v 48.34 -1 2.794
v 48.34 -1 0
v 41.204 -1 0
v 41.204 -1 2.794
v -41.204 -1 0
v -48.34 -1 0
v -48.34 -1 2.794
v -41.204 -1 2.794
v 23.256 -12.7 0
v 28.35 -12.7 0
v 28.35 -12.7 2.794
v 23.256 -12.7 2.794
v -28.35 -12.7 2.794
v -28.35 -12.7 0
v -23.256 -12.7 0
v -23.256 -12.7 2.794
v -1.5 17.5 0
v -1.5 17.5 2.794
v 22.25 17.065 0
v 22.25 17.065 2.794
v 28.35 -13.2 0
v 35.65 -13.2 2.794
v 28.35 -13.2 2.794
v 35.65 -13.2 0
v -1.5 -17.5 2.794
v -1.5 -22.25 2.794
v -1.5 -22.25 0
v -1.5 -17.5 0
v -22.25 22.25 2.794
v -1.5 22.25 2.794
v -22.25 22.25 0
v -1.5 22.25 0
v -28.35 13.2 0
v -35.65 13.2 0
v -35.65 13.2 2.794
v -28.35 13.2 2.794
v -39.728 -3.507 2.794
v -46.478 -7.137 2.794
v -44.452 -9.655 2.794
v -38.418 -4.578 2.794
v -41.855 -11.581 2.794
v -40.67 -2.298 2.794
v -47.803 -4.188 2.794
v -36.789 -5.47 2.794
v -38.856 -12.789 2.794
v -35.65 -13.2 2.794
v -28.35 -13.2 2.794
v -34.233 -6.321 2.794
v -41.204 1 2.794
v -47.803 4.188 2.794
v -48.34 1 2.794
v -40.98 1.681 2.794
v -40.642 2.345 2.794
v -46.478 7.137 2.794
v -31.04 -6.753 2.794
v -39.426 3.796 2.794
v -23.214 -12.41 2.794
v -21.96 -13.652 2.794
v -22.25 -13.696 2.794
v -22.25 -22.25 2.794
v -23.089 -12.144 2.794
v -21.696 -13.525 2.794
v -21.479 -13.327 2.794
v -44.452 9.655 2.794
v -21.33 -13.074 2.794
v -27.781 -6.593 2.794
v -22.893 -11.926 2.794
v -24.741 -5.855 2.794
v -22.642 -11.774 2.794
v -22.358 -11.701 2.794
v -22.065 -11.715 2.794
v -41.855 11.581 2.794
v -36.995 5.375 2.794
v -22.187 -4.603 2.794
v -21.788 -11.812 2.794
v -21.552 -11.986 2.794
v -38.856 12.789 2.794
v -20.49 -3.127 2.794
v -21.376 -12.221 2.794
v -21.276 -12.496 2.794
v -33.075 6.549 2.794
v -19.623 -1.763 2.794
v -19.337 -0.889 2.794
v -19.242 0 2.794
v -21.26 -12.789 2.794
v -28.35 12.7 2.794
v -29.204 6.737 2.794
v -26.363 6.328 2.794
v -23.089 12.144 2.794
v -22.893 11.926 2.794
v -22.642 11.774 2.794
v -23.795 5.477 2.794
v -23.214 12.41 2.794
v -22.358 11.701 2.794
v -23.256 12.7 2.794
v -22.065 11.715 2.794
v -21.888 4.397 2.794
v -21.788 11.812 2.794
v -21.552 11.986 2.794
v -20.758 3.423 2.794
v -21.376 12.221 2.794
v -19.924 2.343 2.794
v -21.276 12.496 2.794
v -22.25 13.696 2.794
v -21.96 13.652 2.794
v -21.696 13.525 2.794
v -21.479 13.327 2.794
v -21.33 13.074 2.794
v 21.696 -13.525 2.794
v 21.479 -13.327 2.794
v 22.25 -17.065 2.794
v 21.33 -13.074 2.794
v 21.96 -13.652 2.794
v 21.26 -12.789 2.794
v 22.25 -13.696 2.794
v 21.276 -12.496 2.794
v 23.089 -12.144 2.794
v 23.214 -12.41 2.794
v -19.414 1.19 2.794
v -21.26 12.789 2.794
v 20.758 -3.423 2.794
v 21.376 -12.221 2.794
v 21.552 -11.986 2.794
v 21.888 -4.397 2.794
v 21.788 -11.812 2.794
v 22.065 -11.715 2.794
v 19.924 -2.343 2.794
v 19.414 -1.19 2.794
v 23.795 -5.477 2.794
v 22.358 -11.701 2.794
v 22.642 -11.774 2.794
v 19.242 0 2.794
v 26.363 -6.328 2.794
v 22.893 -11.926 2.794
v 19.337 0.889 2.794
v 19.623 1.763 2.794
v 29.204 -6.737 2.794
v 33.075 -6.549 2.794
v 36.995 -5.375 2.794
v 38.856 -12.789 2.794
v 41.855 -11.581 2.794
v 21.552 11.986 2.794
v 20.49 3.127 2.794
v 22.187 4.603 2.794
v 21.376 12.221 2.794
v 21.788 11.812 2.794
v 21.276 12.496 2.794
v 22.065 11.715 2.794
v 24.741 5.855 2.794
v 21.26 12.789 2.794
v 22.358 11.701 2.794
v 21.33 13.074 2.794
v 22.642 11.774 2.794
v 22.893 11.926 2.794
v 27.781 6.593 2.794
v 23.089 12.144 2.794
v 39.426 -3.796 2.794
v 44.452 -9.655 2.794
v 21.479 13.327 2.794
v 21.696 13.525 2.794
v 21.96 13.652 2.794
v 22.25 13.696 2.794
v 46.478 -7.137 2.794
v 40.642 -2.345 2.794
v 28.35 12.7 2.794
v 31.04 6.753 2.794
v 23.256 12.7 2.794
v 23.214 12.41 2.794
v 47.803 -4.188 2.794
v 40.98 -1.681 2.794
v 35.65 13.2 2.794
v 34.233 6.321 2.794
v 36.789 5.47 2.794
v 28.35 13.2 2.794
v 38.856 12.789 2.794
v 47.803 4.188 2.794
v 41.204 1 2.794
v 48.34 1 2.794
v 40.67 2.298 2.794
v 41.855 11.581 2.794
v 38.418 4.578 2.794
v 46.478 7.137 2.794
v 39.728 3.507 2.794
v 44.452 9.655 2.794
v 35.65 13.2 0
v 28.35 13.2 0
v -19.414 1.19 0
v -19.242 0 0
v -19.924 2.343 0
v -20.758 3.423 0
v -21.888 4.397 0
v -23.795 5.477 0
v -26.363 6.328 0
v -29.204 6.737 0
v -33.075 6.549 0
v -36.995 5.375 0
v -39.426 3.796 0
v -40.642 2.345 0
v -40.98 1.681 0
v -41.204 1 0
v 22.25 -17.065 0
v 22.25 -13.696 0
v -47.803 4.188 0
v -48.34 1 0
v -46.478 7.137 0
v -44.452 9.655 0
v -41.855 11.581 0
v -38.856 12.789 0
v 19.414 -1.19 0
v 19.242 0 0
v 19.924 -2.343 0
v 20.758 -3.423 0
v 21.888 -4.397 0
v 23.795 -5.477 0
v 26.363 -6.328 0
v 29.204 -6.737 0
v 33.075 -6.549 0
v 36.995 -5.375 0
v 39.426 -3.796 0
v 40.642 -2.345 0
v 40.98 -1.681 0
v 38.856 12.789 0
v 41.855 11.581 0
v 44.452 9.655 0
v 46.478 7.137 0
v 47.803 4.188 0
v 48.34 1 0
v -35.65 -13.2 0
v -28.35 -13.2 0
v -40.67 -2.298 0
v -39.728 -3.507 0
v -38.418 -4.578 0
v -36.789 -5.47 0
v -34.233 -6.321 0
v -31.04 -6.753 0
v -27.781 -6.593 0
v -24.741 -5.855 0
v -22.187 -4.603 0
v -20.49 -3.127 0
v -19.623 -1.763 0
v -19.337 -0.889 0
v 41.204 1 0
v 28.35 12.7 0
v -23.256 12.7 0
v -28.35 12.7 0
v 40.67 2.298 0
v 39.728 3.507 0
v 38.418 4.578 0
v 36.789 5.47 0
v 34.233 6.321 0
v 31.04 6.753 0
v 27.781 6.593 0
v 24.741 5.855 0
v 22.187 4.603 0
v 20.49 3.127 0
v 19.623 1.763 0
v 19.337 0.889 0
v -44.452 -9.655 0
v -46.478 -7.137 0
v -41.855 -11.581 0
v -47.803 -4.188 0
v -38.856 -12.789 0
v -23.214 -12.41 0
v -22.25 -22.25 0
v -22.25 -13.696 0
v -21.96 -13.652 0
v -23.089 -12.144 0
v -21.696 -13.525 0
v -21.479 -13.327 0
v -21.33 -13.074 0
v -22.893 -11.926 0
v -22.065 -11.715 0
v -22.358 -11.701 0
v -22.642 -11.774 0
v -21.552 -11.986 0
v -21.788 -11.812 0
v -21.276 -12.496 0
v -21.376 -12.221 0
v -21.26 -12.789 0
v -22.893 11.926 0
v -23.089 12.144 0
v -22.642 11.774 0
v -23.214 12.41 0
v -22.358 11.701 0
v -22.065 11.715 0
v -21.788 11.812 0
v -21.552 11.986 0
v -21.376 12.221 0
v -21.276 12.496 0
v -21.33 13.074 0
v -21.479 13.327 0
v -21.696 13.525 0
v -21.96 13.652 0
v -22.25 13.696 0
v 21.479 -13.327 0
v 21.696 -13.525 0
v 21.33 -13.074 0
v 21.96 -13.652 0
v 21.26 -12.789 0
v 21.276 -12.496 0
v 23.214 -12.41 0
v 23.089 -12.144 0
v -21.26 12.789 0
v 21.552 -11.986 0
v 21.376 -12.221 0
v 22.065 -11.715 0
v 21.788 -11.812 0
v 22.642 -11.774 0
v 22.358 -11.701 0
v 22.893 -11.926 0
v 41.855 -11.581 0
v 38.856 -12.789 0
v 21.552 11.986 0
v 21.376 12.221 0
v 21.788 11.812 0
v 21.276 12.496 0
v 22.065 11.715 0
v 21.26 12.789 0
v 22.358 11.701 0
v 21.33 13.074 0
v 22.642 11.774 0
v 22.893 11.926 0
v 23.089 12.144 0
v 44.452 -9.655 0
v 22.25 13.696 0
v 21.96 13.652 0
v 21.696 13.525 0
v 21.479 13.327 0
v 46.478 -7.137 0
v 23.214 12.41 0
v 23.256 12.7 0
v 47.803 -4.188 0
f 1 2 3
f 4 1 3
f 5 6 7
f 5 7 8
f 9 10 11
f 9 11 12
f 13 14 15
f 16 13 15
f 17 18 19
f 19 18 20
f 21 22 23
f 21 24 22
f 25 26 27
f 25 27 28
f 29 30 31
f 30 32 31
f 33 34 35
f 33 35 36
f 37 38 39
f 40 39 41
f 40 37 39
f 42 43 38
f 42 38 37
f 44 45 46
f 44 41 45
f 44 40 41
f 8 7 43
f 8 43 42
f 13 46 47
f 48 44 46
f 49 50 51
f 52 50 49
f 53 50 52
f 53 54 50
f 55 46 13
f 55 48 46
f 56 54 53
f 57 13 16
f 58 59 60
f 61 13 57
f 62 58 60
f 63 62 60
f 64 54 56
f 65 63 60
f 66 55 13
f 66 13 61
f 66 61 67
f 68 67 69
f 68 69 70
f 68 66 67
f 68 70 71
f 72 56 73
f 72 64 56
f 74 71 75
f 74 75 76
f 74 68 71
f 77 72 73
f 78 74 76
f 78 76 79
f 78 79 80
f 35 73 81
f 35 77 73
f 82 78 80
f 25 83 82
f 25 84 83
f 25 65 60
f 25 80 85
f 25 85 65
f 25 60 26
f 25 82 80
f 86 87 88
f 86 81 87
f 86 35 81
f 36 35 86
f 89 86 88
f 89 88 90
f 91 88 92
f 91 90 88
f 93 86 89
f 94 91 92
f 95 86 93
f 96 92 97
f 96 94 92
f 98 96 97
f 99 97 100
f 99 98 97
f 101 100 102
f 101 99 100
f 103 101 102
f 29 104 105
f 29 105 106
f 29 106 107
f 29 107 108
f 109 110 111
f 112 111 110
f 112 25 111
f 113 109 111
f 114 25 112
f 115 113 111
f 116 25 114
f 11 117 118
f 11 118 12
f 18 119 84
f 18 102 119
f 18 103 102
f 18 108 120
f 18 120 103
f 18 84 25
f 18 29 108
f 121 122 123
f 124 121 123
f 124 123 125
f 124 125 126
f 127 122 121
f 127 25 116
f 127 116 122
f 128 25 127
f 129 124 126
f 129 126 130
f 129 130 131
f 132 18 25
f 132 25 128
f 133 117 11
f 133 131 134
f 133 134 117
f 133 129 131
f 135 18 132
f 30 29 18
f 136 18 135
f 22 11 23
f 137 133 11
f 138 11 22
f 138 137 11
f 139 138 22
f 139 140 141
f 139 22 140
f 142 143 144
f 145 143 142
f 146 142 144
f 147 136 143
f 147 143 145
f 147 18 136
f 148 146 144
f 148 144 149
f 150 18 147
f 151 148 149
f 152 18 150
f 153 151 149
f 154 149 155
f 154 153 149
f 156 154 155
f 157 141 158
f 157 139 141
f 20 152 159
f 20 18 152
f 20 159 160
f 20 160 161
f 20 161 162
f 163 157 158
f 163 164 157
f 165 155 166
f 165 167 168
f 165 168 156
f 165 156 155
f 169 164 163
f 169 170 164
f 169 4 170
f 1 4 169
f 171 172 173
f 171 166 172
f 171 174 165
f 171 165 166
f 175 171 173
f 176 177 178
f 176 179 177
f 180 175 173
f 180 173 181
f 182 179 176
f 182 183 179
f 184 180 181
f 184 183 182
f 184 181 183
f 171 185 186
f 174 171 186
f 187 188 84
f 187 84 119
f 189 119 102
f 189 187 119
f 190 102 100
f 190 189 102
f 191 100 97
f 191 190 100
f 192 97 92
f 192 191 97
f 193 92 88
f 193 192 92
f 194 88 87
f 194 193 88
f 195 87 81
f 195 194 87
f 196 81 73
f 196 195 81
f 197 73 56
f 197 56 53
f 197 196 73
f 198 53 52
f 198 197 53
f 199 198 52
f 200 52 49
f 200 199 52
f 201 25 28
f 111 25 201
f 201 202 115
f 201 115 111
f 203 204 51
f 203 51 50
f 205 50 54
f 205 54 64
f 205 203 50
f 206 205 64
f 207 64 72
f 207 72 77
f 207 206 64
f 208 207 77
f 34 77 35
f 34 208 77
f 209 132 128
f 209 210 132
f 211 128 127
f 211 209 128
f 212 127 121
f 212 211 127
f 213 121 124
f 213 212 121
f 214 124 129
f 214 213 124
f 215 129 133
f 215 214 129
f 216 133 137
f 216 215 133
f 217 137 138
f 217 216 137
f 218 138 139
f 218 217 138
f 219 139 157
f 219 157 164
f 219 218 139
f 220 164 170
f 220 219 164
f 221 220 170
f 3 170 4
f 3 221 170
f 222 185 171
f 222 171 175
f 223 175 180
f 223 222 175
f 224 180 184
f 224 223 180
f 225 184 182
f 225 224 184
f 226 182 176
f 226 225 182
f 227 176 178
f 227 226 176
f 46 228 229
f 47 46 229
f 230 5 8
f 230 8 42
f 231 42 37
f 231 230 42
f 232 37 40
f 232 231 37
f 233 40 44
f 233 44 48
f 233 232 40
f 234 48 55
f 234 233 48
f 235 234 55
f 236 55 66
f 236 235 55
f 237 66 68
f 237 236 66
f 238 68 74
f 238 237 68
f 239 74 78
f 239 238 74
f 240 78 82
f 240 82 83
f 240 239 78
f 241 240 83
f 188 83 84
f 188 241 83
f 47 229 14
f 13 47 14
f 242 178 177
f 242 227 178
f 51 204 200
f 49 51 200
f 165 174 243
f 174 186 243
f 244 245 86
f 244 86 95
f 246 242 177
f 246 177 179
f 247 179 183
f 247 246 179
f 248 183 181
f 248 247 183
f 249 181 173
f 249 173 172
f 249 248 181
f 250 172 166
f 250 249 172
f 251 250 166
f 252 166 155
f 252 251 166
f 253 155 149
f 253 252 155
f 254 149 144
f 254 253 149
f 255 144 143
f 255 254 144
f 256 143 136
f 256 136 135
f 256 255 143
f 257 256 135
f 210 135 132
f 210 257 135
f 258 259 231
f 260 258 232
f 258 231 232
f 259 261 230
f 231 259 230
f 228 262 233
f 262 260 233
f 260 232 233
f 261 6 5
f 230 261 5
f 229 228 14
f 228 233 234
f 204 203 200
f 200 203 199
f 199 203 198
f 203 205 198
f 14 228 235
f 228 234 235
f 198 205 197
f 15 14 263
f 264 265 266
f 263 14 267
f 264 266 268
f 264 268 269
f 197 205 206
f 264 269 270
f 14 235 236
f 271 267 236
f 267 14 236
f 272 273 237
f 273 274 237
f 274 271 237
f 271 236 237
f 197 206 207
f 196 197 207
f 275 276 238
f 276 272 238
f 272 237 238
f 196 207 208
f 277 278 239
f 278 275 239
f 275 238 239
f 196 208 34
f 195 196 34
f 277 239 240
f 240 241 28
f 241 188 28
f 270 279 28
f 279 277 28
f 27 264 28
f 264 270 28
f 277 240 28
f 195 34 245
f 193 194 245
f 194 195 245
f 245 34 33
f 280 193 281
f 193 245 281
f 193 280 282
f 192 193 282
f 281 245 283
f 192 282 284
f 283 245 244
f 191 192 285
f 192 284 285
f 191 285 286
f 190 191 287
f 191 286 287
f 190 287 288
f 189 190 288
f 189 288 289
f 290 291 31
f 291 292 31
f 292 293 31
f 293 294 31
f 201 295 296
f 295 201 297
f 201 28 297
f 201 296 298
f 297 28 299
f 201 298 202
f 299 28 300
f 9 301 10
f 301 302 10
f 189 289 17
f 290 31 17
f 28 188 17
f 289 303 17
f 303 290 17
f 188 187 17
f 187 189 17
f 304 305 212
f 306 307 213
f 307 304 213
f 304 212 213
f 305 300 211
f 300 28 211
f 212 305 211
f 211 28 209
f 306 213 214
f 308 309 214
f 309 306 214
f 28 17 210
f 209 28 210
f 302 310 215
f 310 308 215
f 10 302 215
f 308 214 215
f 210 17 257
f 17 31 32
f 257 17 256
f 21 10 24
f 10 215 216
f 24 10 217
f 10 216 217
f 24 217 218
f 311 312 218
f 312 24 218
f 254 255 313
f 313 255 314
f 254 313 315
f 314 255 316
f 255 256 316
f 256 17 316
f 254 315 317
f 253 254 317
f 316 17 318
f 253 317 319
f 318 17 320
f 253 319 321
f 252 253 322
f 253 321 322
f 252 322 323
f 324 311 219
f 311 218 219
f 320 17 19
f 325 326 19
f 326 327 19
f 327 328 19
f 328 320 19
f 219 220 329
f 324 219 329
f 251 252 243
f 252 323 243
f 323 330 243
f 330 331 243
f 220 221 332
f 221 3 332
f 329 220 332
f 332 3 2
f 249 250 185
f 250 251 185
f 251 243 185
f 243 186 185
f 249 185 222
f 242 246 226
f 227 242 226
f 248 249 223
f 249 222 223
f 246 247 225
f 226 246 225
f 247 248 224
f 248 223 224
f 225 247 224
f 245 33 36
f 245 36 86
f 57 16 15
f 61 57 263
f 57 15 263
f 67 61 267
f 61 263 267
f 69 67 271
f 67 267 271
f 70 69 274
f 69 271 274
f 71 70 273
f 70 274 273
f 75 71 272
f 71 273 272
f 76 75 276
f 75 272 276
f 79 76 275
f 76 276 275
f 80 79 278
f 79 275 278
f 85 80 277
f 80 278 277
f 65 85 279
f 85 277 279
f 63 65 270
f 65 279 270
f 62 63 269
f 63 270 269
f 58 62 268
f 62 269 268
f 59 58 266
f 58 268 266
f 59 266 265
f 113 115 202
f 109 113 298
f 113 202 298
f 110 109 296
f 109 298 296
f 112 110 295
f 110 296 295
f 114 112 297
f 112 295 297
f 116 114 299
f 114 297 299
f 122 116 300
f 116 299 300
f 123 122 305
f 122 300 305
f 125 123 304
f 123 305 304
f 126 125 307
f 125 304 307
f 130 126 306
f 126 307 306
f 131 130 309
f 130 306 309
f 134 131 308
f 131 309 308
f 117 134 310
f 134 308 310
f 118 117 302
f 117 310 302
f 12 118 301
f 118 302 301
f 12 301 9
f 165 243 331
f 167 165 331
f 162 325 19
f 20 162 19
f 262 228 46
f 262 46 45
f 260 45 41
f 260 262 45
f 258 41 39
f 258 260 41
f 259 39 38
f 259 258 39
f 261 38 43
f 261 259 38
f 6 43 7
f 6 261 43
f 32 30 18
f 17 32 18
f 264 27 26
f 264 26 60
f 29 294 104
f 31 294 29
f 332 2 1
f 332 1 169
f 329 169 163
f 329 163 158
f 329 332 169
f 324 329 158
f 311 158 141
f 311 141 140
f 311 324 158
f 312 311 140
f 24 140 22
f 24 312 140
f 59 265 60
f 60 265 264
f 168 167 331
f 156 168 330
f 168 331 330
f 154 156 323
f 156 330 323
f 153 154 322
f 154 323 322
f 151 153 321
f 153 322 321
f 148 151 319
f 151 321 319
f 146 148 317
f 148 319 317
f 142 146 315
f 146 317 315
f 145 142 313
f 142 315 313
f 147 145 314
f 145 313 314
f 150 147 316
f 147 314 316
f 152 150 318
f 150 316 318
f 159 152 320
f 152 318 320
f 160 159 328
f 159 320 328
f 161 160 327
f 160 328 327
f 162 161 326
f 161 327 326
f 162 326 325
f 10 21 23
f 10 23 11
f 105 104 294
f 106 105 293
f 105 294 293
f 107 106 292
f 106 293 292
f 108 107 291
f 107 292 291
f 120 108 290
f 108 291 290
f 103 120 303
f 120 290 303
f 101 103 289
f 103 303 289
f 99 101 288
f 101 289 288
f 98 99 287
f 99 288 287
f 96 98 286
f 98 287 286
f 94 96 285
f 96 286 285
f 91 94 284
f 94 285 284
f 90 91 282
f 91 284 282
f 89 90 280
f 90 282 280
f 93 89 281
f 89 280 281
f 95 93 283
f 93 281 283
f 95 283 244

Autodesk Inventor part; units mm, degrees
ref_plane "YZ Plane" through (0, 0, 0) normal (1, 0, 0) x (0, 1, 0)
ref_plane "XZ Plane" through (0, 0, 0) normal (0, 1, 0) x (-1, 0, 0)
ref_plane "XY Plane" through (0, 0, 0) normal (0, 0, 1) x (1, 0, 0)
sketch "Sketch1" plane through (0, 0, 0) normal (0, 0, 1) x (1, 0, 0)
  line L0 (48.35, 0) -> (48.35, 13.2)
  line L1 (48.35, 13.2) -> (28.35, 13.2)
  line L2 (28.35, 13.2) -> (28.35, 12.7)
  line L3 (28.35, 12.7) -> (22.25, 12.7)
  line L4 (12.2521, 0) -> (48.35, 0)
  line L5 (22.25, 12.7) -> (22.25, 22.25)
  line L6 (22.25, 22.25) -> (0, 22.25)
  line L7 (48.35, 1) -> (41.2045, 1)
  line L8 (48.35, 0) -> (48.35, -13.2)
  line L9 (48.35, -13.2) -> (28.35, -13.2)
  line L10 (28.35, -13.2) -> (28.35, -12.7)
  line L11 (28.35, -12.7) -> (22.25, -12.7)
  line L12 (22.25, -12.7) -> (22.25, -22.25)
  line L13 (22.25, -22.25) -> (0, -22.25)
  line L14 (48.35, -1) -> (41.2045, -1)
  line L15 (0, 22.25) -> (0, -22.25)
  ellipse E0 centre (30.2836, 0) end of major axis (41.3256, 0) minor radius 6.7692 (41.2045, 1) -> (41.2045, -1) ccw
  point P0 (0, 0)
  point P1 (17.8114, 0)
  point P2 (41.275, 1)
  point P3 (41.275, -1)
  dimension "d0" = 13.2
  dimension "d1" = 20
  dimension "d6" = 12.7
  dimension "d7" = 22.25
  dimension "d8" = 22.25
  dimension "d9" = 6.1
  dimension "d17" = 48.35
  dimension "d34" = 1
extrude "Extrusion2" add sketch "Sketch1" along normal blind 2.794 contours L7 E0 L14 L8 L9 L10 L11 L12 L13 L15 L6 L5 L3 L2 L1 L0
pattern_circular "Circular Pattern1" count 2 over 360 about axis through (0, 0, -10) along (0, 0, 1) of "Extrusion2"
fillet "Fillet2" radius 12.7 2 edges at (48.35, 13.2, 1.397) (48.35, -13.2, 1.397)
fillet "Fillet3" radius 12.7 2 edges at (-48.35, -13.2, 1.397) (-48.35, 13.2, 1.397)
sketch "Sketch3" plane through (0, 0, 2.794) normal (0, 0, 1) x (1, 0, 0)
  line L0 (22.25, 12.7) -> (22.25, 22.25) projected
  line L1 (22.25, 22.25) -> (-22.25, 22.25) projected
  line L2 (-1.5, 17.5) -> (22.25, 17.0652)
  line L3 (22.25, 22.25) -> (22.25, 17.0652)
  line L4 (0, 0) -> (6.35, 0)
  line L5 (22.25, -12.7) -> (22.25, -22.25)
  line L6 (22.25, -22.25) -> (22.25, -17.0652)
  line L7 (-28.35, 13.2) -> (-35.6598, 13.2) projected
  line L8 (-1.5, 22.25) -> (-1.5, 17.5)
  line L9 (21.8285, 22.25) -> (-1.5, 22.25)
  line L10 (22.25, -12.7) -> (22.25, -22.25)
  line L11 (22.25, -22.25) -> (-22.25, -22.25)
  line L12 (-1.5, -17.5) -> (22.25, -17.0652)
  line L13 (-1.5, -22.25) -> (-1.5, -17.5)
  point P0 (0, 22.25)
  dimension "d32" = 1.5
  dimension "d33" = 17.5
extrude "Extrusion4" cut sketch "Sketch3" against normal up to next
hole "Hole1" at (22.2556, 12.6962, 2.794) direction (0, 0, -1) diameter 2 end through all
mirror "Mirror1" about plane through (0, 0, 0) normal (1, 0, 0) of "Hole1"
mirror "Mirror2" about plane through (0, 0, 0) normal (0, 1, 0) of "Hole1", "Mirror1"
equation "\"d7\" = d8"
properties part number "LockZ"
